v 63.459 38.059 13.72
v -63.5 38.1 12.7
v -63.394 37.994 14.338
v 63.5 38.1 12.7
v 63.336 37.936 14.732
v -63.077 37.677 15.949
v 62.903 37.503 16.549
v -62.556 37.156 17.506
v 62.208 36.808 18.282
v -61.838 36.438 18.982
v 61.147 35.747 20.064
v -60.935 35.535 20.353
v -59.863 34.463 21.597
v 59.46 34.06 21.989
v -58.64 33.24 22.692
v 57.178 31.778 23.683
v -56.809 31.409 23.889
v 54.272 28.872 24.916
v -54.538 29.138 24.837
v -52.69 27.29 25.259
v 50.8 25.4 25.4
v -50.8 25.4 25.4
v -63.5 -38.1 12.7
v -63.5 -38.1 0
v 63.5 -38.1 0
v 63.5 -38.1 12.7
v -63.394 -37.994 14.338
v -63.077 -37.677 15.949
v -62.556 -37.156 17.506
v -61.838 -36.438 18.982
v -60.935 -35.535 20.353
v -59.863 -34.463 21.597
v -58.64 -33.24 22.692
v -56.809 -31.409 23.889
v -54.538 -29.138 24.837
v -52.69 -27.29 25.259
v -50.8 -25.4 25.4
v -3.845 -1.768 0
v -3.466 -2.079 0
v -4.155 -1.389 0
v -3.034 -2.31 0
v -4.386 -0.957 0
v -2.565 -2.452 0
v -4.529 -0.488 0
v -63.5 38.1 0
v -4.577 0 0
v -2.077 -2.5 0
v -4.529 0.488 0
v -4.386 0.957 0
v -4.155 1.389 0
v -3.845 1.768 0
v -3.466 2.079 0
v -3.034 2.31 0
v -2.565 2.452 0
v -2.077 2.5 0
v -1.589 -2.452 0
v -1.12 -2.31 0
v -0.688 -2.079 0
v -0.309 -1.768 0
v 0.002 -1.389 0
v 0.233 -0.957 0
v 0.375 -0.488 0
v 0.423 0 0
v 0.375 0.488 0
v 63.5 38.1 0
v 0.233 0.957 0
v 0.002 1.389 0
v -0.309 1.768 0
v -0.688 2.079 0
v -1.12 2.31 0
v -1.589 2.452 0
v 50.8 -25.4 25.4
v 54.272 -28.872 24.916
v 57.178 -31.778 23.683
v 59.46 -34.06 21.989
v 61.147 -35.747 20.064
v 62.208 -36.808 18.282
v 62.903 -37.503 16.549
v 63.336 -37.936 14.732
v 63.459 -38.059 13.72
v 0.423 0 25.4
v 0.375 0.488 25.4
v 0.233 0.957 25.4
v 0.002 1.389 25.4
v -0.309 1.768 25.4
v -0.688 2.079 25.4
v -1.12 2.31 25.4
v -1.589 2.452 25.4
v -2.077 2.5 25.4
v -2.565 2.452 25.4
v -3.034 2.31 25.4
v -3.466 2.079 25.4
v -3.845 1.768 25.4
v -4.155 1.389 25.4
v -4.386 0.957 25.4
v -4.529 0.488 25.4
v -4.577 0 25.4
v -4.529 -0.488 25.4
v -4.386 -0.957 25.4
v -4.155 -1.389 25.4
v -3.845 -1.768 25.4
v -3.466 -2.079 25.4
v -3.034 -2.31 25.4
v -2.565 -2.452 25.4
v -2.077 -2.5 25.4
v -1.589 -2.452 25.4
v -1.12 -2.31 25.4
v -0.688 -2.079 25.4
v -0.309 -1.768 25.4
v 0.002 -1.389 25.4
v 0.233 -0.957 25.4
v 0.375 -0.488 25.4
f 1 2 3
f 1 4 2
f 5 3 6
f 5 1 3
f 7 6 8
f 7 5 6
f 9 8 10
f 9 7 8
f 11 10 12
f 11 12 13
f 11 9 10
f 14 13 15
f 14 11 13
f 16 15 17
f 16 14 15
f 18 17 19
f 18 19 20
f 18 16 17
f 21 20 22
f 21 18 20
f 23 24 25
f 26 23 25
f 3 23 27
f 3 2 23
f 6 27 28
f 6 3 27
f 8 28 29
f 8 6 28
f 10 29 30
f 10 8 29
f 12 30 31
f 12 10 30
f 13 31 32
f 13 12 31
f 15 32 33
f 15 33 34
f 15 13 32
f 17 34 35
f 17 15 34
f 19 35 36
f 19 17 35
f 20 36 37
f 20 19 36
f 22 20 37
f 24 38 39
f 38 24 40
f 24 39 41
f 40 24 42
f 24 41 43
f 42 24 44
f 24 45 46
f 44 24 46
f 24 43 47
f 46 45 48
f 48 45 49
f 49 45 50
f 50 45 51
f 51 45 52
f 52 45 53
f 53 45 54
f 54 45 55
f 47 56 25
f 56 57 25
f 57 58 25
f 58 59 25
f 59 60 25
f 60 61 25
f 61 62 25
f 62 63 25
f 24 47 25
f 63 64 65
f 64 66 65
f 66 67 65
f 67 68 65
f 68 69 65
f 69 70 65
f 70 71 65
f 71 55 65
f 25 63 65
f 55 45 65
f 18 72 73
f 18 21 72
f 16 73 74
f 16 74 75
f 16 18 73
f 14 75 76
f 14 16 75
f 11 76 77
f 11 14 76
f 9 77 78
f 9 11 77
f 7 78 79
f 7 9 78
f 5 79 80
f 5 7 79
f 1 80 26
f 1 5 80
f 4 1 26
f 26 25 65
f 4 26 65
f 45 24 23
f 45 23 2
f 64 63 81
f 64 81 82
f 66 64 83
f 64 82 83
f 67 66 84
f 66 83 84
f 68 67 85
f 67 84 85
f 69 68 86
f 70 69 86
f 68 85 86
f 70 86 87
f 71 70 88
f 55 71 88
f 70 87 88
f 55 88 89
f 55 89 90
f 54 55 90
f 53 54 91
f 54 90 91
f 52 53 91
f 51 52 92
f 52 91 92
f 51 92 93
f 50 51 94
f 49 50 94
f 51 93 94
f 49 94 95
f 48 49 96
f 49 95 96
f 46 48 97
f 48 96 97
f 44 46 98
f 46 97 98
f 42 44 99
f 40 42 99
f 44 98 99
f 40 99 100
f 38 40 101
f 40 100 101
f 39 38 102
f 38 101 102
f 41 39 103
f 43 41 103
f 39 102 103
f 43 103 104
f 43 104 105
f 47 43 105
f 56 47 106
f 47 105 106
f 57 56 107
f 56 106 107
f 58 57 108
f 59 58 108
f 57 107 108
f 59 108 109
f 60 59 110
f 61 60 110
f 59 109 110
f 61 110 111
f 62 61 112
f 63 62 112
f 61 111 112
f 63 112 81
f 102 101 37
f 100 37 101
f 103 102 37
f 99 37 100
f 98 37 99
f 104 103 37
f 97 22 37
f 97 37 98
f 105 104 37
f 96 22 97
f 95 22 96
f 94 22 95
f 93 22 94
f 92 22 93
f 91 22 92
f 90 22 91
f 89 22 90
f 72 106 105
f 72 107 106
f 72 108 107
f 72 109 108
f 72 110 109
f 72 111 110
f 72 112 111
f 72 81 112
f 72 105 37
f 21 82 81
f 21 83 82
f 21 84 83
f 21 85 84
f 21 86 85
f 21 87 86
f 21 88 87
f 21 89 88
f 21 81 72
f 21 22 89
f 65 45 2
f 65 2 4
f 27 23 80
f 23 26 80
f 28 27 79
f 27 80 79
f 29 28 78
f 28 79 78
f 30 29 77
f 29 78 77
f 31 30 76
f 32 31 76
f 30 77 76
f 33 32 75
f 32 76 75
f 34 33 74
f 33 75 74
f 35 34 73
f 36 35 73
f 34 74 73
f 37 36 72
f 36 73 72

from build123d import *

# Parameters (mm, degrees)
F0_W     = 127
F0_H     = 76.2
F1_DEPTH = 25.4
F2_R     = 2.5
F3_DEPTH = 25.4
F4_R     = 12.7


with BuildPart() as f1:
    # F0 (on Top) → F1 (new body)
    with BuildSketch(Plane.XY):
        Rectangle(F0_W, F0_H)
    extrude(amount=F1_DEPTH)

    # F2 (on face) → F3 (cut)
    with BuildSketch(Plane.XY.offset(25.4)):
        with Locations((-2.076801, 0)):
            Circle(F2_R)
    extrude(amount=-F3_DEPTH, mode=Mode.SUBTRACT)

    # F4
    f4_edges = [f1.edges().sort_by_distance(p)[0] for p in [
        (63.5, 0, 25.4),
        (0, 38.1, 25.4),
        (0, -38.1, 25.4),
        (-63.5, 0, 25.4),
    ]]
    fillet(f4_edges, radius=F4_R)


solid = f1.part
